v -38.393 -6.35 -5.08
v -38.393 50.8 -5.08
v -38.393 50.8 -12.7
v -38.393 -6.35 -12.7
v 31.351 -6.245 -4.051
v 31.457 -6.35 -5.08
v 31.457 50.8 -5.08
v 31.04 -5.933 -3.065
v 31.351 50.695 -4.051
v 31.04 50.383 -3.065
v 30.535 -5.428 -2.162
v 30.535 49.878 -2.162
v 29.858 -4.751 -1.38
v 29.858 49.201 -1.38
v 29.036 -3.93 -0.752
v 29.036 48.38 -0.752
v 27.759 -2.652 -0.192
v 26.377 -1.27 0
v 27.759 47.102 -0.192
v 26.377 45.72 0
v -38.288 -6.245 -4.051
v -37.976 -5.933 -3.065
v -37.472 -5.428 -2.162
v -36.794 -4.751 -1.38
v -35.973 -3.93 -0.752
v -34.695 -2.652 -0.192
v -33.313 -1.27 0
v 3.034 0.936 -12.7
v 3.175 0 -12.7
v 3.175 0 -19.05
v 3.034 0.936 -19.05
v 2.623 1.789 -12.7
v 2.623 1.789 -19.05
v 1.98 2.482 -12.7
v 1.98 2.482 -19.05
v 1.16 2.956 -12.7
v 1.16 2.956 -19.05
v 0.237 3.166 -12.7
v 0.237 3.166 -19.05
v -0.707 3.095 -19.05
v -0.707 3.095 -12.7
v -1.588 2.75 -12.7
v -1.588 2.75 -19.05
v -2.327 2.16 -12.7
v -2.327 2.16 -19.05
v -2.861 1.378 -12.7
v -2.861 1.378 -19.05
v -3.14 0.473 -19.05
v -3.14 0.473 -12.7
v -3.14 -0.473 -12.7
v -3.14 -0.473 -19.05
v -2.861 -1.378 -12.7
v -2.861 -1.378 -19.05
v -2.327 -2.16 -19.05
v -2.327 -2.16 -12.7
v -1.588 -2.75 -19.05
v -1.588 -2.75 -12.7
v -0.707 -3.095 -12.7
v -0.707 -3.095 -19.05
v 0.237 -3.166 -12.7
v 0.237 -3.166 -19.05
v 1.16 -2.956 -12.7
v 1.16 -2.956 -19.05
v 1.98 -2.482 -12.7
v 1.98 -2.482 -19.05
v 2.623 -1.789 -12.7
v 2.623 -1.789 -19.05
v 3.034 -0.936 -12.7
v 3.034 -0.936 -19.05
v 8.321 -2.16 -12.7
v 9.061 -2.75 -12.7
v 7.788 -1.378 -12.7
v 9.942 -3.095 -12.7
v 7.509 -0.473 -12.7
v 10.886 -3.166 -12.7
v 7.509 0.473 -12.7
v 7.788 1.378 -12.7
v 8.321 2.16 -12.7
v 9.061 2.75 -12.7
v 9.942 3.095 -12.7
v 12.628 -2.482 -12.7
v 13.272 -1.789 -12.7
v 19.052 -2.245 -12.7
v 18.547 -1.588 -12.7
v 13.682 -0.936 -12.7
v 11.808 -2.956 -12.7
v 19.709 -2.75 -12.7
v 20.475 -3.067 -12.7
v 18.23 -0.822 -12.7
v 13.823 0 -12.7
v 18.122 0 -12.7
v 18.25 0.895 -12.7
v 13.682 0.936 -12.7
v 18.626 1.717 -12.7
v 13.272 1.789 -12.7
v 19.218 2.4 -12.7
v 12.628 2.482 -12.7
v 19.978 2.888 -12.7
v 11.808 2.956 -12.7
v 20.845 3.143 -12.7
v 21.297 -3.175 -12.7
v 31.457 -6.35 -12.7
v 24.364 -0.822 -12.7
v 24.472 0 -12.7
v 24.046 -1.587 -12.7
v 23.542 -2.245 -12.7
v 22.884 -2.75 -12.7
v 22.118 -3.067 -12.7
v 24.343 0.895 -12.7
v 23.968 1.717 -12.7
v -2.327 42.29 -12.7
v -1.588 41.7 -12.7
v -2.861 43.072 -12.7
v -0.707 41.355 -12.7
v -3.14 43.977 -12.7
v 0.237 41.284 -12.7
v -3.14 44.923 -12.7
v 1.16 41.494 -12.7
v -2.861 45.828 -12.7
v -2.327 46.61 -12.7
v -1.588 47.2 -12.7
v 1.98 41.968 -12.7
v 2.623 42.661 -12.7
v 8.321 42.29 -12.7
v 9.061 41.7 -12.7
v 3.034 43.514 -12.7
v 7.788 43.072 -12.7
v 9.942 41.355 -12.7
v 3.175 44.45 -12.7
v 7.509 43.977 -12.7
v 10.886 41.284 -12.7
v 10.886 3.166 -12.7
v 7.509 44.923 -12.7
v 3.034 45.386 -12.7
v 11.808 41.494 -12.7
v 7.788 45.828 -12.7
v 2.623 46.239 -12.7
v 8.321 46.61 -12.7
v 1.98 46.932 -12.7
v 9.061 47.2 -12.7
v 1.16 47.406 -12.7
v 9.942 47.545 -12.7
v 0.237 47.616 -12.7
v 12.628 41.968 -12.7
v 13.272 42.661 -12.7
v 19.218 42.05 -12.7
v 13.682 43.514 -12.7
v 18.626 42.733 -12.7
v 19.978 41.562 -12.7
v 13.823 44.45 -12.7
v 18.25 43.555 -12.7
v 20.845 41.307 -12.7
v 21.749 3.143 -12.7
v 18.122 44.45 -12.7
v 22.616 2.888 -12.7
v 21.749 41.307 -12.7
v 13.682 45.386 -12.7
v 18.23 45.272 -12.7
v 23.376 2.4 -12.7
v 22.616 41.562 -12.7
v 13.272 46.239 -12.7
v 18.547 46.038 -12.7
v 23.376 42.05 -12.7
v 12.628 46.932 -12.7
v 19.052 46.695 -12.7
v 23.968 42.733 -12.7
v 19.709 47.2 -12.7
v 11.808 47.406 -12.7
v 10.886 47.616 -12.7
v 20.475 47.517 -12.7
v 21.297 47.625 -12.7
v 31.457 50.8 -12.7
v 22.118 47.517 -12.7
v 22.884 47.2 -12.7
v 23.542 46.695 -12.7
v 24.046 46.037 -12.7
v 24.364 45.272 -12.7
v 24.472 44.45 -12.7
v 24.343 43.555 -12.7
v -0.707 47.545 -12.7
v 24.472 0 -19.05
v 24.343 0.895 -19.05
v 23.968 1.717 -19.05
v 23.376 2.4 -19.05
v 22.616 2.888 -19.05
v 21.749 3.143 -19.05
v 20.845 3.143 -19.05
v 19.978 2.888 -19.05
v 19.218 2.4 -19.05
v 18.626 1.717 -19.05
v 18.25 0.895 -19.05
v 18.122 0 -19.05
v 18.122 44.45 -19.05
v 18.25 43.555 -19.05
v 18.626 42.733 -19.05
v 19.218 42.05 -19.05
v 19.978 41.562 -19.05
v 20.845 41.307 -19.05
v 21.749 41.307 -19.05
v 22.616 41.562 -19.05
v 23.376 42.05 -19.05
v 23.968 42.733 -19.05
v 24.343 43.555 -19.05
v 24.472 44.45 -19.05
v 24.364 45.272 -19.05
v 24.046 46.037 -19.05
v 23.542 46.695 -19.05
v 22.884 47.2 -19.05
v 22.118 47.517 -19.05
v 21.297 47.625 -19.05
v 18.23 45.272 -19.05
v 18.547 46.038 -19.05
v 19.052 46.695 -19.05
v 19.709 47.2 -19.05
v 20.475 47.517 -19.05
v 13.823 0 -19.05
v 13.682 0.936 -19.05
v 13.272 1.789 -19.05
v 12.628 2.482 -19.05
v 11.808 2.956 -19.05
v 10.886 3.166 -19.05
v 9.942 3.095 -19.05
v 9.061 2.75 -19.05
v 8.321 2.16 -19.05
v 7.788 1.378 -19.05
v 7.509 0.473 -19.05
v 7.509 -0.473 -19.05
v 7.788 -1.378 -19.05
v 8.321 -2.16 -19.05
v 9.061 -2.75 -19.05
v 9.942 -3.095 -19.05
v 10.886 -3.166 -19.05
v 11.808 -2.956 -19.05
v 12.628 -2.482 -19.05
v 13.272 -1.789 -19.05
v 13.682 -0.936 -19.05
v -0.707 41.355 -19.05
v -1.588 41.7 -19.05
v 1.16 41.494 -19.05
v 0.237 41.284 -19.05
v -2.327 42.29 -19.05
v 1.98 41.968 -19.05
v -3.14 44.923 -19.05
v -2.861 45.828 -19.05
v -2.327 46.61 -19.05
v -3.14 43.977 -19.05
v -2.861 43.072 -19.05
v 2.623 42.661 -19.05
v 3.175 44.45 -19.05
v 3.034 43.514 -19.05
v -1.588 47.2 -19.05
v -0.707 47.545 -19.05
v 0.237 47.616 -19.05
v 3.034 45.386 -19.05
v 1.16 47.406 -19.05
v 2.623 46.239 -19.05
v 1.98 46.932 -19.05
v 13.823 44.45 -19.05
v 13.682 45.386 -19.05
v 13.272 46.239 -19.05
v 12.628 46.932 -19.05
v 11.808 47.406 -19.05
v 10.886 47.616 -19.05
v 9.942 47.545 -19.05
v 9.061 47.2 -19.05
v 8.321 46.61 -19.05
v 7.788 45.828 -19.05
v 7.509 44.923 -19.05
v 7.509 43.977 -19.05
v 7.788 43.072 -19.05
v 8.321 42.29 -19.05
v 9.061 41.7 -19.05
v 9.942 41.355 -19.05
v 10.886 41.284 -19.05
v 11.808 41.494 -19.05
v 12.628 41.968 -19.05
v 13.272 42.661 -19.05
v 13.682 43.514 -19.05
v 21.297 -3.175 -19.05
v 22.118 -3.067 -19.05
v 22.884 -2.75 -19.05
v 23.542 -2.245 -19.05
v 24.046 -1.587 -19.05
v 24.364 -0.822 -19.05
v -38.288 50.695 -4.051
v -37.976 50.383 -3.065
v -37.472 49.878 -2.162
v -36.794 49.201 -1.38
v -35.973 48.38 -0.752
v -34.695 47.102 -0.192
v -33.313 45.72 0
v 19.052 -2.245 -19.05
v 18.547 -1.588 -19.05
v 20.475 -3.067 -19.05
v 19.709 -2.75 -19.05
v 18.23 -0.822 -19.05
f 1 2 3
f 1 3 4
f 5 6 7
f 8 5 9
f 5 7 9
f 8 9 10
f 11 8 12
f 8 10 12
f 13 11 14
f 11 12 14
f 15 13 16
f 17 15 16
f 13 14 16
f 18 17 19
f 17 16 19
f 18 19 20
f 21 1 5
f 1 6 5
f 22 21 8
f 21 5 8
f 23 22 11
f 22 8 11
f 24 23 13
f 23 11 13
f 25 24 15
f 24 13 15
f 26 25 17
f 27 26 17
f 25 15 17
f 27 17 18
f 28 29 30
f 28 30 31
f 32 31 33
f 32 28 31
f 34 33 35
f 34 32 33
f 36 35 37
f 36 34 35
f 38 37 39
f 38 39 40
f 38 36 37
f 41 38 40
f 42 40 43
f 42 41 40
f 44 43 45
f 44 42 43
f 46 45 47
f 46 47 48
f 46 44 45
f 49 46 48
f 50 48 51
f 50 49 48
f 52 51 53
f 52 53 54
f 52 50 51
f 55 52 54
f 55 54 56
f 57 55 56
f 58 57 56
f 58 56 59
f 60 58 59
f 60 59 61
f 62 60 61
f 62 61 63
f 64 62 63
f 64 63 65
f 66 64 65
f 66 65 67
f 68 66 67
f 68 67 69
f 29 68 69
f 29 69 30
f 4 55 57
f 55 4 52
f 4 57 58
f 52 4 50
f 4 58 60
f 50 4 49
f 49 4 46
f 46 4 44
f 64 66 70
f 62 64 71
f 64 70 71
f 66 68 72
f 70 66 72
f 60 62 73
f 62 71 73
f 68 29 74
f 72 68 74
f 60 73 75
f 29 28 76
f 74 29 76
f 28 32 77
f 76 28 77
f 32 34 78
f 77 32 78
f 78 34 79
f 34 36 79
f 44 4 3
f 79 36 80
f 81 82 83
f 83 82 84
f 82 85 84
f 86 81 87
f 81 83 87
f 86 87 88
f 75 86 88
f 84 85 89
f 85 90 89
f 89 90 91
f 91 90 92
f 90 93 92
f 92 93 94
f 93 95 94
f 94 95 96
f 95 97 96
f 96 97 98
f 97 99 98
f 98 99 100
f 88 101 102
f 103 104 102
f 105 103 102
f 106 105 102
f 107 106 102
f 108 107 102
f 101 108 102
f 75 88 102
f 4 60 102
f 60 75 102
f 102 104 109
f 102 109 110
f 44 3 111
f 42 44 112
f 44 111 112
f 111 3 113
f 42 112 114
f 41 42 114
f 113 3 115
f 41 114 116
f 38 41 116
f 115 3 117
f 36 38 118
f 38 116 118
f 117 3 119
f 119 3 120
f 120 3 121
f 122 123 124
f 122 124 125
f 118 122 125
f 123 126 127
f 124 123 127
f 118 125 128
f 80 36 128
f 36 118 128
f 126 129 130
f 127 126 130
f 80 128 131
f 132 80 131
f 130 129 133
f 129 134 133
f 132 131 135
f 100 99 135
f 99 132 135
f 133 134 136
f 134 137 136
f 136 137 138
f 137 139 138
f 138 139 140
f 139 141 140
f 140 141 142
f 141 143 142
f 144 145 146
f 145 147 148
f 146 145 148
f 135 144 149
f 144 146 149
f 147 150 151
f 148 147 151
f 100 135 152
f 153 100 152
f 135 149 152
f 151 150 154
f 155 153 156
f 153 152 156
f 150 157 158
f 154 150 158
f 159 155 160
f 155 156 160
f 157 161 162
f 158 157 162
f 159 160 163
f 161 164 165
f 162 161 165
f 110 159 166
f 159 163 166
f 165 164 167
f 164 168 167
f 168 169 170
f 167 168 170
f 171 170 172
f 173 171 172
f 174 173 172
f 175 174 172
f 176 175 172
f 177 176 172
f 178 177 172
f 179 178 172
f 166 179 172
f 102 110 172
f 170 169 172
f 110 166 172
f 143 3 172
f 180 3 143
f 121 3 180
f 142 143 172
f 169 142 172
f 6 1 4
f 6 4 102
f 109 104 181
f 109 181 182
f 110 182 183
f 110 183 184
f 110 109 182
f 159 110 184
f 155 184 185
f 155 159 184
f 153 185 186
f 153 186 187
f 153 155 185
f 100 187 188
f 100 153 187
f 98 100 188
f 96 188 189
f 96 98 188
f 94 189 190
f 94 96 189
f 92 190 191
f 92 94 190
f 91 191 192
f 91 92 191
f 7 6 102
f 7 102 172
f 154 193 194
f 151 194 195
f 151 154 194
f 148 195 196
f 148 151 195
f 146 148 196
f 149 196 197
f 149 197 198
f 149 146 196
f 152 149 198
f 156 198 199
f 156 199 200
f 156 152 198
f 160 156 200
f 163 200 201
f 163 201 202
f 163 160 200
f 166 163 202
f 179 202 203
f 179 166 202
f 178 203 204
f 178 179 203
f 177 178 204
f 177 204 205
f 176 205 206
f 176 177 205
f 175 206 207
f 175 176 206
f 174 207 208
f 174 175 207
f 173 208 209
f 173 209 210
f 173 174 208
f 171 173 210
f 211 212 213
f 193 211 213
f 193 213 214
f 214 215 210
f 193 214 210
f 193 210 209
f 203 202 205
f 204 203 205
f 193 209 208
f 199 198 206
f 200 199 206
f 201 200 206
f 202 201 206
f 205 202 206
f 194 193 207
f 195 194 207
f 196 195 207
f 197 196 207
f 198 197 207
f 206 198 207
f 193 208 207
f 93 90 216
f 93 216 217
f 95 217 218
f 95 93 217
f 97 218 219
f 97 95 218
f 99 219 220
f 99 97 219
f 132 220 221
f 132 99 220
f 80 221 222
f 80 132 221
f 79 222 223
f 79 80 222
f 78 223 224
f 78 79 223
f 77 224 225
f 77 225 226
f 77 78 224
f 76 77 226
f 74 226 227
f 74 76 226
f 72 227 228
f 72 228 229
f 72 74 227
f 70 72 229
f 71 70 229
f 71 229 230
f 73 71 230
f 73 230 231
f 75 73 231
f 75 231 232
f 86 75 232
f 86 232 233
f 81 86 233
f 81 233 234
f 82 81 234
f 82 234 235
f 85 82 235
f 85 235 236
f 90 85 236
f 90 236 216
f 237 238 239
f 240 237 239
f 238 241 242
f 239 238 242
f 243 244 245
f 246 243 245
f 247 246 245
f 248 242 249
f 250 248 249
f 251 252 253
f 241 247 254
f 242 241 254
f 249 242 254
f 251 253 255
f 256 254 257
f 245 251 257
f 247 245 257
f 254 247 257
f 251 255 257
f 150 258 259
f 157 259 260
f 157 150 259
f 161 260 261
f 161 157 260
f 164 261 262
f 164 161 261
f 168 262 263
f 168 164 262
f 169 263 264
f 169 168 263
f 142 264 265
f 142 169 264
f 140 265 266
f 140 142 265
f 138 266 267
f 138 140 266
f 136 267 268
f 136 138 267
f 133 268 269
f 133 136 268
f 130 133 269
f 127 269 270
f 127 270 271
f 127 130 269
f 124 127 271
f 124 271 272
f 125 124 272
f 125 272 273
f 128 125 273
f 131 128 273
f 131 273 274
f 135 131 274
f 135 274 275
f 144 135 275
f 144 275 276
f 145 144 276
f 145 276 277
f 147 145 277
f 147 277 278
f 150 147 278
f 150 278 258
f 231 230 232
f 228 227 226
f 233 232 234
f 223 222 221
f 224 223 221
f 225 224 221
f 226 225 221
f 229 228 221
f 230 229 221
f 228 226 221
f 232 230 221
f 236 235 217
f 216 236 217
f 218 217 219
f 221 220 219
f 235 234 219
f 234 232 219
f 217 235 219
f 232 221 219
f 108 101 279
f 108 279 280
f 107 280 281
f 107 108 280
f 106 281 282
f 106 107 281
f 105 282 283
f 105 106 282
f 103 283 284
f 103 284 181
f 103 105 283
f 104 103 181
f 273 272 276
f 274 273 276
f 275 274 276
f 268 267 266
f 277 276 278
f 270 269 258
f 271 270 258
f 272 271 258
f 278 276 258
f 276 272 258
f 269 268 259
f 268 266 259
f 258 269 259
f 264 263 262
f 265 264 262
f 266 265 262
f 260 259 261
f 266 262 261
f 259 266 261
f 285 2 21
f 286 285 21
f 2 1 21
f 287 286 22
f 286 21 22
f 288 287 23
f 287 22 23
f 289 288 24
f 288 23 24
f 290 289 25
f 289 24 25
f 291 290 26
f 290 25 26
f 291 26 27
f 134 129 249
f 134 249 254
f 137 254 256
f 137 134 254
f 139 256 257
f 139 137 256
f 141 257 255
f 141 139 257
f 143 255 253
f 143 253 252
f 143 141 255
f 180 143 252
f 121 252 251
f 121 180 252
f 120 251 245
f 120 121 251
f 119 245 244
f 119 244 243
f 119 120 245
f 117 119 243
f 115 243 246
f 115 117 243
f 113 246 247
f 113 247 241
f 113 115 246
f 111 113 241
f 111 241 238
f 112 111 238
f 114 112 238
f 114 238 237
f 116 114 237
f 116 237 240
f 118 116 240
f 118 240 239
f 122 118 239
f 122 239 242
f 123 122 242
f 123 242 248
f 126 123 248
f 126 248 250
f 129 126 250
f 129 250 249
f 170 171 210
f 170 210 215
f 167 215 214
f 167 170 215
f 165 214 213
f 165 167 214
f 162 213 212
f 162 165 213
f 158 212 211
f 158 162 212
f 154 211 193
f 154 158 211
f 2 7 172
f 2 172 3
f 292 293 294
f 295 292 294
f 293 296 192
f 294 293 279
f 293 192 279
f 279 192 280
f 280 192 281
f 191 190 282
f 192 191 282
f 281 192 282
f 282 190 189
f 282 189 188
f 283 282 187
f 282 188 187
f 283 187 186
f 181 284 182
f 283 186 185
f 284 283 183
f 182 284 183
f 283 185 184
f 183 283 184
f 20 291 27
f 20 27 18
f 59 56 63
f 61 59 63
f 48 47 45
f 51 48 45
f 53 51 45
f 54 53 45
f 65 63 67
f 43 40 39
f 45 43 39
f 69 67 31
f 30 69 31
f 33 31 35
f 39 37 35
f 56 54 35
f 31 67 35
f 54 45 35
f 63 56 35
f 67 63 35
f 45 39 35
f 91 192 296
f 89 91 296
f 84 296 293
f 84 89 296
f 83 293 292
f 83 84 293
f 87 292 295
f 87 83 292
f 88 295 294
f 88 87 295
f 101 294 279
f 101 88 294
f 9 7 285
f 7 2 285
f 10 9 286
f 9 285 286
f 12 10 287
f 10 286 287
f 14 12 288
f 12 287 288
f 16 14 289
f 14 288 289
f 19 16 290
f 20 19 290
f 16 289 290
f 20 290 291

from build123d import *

# Parameters (mm, degrees)
F0_R     = 3.175
F1_DEPTH = 12.7
F2_DEPTH = 19.05
F3_R     = 5.08


with BuildPart() as f1:
    # F0 (on Top) → F1 (new body)
    with BuildSketch(Plane.XY):
        with BuildLine():
            Line((21.2967025781, 50.8), (-38.3932974219, 50.8))
            Line((-38.3932974219, 50.8), (-38.3932974219, -6.35))
            Line((-38.3932974219, -6.35), (21.2967025781, -6.35))
            Line((21.2967025781, -6.35), (21.2967025781, -3.175))
            ThreePointArc((21.2967025781, -3.175), (19.0516385478, -2.2450640303), (18.1217025781, 0))
            ThreePointArc((18.1217025781, 0), (21.2967025781, 3.175), (24.4717025781, 0))
            Line((24.4717025781, 0), (31.4567025781, 0))
            Line((31.4567025781, 0), (31.4567025781, 44.45))
            Line((31.4567025781, 44.45), (24.4717025781, 44.45))
            ThreePointArc((24.4717025781, 44.45), (21.2967025781, 41.275), (18.1217025781, 44.45))
            ThreePointArc((18.1217025781, 44.45), (19.0516385478, 46.6950640303), (21.2967025781, 47.625))
            Line((21.2967025781, 47.625), (21.2967025781, 50.8))
        make_face()
        Circle(F0_R, mode=Mode.SUBTRACT)
        with BuildLine():
            ThreePointArc((7.473351289, 0), (10.648351289, 3.175), (13.823351289, 0))
            ThreePointArc((13.823351289, 0), (10.648351289, -3.175), (7.473351289, 0))
        make_face(mode=Mode.SUBTRACT)
        with Locations((0, 44.45)):
            Circle(F0_R, mode=Mode.SUBTRACT)
        with BuildLine():
            ThreePointArc((7.473351289, 44.45), (10.648351289, 47.625), (13.823351289, 44.45))
            ThreePointArc((13.823351289, 44.45), (10.648351289, 41.275), (7.473351289, 44.45))
        make_face(mode=Mode.SUBTRACT)
        with BuildLine():
            Line((31.4567025781, 50.8), (21.2967025781, 50.8))
            Line((21.2967025781, 50.8), (21.2967025781, 47.625))
            ThreePointArc((21.2967025781, 47.625), (23.5417666083, 46.6950640303), (24.4717025781, 44.45))
            Line((24.4717025781, 44.45), (31.4567025781, 44.45))
            Line((31.4567025781, 44.45), (31.4567025781, 50.8))
        make_face()
        with BuildLine():
            Line((21.2967025781, -3.175), (21.2967025781, -6.35))
            Line((21.2967025781, -6.35), (31.4567025781, -6.35))
            Line((31.4567025781, -6.35), (31.4567025781, 0))
            Line((31.4567025781, 0), (24.4717025781, 0))
            ThreePointArc((24.4717025781, 0), (23.5417666083, -2.2450640303), (21.2967025781, -3.175))
        make_face()
    extrude(amount=-F1_DEPTH)

    # F0 (on Top) → F2 (join)
    with BuildSketch(Plane.XY):
        Circle(F0_R)
        with BuildLine():
            ThreePointArc((7.473351289, 0), (10.648351289, -3.175), (13.823351289, 0))
            Line((13.823351289, 0), (7.473351289, 0))
        make_face()
        with BuildLine():
            Line((7.473351289, 0), (13.823351289, 0))
            ThreePointArc((13.823351289, 0), (10.648351289, 3.175), (7.473351289, 0))
        make_face()
        with BuildLine():
            ThreePointArc((24.4717025781, 0), (21.2967025781, 3.175), (18.1217025781, 0))
            Line((18.1217025781, 0), (21.2967025781, 0))
            Line((21.2967025781, 0), (24.4717025781, 0))
        make_face()
        with BuildLine():
            ThreePointArc((18.1217025781, 0), (19.0516385478, -2.2450640303), (21.2967025781, -3.175))
            Line((21.2967025781, -3.175), (21.2967025781, 0))
            Line((21.2967025781, 0), (18.1217025781, 0))
        make_face()
        with BuildLine():
            Line((21.2967025781, 0), (21.2967025781, -3.175))
            ThreePointArc((21.2967025781, -3.175), (23.5417666083, -2.2450640303), (24.4717025781, 0))
            Line((24.4717025781, 0), (21.2967025781, 0))
        make_face()
        with Locations((0, 44.45)):
            Circle(F0_R)
        with BuildLine():
            ThreePointArc((7.473351289, 44.45), (10.648351289, 41.275), (13.823351289, 44.45))
            Line((13.823351289, 44.45), (7.473351289, 44.45))
        make_face()
        with BuildLine():
            Line((7.473351289, 44.45), (13.823351289, 44.45))
            ThreePointArc((13.823351289, 44.45), (10.648351289, 47.625), (7.473351289, 44.45))
        make_face()
        with BuildLine():
            ThreePointArc((24.4717025781, 44.45), (23.5417666083, 46.6950640303), (21.2967025781, 47.625))
            Line((21.2967025781, 47.625), (21.2967025781, 44.45))
            Line((21.2967025781, 44.45), (24.4717025781, 44.45))
        make_face()
        with BuildLine():
            Line((21.2967025781, 44.45), (21.2967025781, 47.625))
            ThreePointArc((21.2967025781, 47.625), (19.0516385478, 46.6950640303), (18.1217025781, 44.45))
            Line((18.1217025781, 44.45), (21.2967025781, 44.45))
        make_face()
        with BuildLine():
            ThreePointArc((18.1217025781, 44.45), (21.2967025781, 41.275), (24.4717025781, 44.45))
            Line((24.4717025781, 44.45), (21.2967025781, 44.45))
            Line((21.2967025781, 44.45), (18.1217025781, 44.45))
        make_face()
    extrude(amount=-F2_DEPTH)

    # F3
    f3_edges = [f1.edges().sort_by_distance(p)[0] for p in [
        (-38.393297, 22.225, 0),
        (-3.468297, -6.35, 0),
        (31.456703, 22.225, 0),
        (-3.468297, 50.8, 0),
    ]]
    fillet(f3_edges, radius=F3_R)


solid = f1.part
